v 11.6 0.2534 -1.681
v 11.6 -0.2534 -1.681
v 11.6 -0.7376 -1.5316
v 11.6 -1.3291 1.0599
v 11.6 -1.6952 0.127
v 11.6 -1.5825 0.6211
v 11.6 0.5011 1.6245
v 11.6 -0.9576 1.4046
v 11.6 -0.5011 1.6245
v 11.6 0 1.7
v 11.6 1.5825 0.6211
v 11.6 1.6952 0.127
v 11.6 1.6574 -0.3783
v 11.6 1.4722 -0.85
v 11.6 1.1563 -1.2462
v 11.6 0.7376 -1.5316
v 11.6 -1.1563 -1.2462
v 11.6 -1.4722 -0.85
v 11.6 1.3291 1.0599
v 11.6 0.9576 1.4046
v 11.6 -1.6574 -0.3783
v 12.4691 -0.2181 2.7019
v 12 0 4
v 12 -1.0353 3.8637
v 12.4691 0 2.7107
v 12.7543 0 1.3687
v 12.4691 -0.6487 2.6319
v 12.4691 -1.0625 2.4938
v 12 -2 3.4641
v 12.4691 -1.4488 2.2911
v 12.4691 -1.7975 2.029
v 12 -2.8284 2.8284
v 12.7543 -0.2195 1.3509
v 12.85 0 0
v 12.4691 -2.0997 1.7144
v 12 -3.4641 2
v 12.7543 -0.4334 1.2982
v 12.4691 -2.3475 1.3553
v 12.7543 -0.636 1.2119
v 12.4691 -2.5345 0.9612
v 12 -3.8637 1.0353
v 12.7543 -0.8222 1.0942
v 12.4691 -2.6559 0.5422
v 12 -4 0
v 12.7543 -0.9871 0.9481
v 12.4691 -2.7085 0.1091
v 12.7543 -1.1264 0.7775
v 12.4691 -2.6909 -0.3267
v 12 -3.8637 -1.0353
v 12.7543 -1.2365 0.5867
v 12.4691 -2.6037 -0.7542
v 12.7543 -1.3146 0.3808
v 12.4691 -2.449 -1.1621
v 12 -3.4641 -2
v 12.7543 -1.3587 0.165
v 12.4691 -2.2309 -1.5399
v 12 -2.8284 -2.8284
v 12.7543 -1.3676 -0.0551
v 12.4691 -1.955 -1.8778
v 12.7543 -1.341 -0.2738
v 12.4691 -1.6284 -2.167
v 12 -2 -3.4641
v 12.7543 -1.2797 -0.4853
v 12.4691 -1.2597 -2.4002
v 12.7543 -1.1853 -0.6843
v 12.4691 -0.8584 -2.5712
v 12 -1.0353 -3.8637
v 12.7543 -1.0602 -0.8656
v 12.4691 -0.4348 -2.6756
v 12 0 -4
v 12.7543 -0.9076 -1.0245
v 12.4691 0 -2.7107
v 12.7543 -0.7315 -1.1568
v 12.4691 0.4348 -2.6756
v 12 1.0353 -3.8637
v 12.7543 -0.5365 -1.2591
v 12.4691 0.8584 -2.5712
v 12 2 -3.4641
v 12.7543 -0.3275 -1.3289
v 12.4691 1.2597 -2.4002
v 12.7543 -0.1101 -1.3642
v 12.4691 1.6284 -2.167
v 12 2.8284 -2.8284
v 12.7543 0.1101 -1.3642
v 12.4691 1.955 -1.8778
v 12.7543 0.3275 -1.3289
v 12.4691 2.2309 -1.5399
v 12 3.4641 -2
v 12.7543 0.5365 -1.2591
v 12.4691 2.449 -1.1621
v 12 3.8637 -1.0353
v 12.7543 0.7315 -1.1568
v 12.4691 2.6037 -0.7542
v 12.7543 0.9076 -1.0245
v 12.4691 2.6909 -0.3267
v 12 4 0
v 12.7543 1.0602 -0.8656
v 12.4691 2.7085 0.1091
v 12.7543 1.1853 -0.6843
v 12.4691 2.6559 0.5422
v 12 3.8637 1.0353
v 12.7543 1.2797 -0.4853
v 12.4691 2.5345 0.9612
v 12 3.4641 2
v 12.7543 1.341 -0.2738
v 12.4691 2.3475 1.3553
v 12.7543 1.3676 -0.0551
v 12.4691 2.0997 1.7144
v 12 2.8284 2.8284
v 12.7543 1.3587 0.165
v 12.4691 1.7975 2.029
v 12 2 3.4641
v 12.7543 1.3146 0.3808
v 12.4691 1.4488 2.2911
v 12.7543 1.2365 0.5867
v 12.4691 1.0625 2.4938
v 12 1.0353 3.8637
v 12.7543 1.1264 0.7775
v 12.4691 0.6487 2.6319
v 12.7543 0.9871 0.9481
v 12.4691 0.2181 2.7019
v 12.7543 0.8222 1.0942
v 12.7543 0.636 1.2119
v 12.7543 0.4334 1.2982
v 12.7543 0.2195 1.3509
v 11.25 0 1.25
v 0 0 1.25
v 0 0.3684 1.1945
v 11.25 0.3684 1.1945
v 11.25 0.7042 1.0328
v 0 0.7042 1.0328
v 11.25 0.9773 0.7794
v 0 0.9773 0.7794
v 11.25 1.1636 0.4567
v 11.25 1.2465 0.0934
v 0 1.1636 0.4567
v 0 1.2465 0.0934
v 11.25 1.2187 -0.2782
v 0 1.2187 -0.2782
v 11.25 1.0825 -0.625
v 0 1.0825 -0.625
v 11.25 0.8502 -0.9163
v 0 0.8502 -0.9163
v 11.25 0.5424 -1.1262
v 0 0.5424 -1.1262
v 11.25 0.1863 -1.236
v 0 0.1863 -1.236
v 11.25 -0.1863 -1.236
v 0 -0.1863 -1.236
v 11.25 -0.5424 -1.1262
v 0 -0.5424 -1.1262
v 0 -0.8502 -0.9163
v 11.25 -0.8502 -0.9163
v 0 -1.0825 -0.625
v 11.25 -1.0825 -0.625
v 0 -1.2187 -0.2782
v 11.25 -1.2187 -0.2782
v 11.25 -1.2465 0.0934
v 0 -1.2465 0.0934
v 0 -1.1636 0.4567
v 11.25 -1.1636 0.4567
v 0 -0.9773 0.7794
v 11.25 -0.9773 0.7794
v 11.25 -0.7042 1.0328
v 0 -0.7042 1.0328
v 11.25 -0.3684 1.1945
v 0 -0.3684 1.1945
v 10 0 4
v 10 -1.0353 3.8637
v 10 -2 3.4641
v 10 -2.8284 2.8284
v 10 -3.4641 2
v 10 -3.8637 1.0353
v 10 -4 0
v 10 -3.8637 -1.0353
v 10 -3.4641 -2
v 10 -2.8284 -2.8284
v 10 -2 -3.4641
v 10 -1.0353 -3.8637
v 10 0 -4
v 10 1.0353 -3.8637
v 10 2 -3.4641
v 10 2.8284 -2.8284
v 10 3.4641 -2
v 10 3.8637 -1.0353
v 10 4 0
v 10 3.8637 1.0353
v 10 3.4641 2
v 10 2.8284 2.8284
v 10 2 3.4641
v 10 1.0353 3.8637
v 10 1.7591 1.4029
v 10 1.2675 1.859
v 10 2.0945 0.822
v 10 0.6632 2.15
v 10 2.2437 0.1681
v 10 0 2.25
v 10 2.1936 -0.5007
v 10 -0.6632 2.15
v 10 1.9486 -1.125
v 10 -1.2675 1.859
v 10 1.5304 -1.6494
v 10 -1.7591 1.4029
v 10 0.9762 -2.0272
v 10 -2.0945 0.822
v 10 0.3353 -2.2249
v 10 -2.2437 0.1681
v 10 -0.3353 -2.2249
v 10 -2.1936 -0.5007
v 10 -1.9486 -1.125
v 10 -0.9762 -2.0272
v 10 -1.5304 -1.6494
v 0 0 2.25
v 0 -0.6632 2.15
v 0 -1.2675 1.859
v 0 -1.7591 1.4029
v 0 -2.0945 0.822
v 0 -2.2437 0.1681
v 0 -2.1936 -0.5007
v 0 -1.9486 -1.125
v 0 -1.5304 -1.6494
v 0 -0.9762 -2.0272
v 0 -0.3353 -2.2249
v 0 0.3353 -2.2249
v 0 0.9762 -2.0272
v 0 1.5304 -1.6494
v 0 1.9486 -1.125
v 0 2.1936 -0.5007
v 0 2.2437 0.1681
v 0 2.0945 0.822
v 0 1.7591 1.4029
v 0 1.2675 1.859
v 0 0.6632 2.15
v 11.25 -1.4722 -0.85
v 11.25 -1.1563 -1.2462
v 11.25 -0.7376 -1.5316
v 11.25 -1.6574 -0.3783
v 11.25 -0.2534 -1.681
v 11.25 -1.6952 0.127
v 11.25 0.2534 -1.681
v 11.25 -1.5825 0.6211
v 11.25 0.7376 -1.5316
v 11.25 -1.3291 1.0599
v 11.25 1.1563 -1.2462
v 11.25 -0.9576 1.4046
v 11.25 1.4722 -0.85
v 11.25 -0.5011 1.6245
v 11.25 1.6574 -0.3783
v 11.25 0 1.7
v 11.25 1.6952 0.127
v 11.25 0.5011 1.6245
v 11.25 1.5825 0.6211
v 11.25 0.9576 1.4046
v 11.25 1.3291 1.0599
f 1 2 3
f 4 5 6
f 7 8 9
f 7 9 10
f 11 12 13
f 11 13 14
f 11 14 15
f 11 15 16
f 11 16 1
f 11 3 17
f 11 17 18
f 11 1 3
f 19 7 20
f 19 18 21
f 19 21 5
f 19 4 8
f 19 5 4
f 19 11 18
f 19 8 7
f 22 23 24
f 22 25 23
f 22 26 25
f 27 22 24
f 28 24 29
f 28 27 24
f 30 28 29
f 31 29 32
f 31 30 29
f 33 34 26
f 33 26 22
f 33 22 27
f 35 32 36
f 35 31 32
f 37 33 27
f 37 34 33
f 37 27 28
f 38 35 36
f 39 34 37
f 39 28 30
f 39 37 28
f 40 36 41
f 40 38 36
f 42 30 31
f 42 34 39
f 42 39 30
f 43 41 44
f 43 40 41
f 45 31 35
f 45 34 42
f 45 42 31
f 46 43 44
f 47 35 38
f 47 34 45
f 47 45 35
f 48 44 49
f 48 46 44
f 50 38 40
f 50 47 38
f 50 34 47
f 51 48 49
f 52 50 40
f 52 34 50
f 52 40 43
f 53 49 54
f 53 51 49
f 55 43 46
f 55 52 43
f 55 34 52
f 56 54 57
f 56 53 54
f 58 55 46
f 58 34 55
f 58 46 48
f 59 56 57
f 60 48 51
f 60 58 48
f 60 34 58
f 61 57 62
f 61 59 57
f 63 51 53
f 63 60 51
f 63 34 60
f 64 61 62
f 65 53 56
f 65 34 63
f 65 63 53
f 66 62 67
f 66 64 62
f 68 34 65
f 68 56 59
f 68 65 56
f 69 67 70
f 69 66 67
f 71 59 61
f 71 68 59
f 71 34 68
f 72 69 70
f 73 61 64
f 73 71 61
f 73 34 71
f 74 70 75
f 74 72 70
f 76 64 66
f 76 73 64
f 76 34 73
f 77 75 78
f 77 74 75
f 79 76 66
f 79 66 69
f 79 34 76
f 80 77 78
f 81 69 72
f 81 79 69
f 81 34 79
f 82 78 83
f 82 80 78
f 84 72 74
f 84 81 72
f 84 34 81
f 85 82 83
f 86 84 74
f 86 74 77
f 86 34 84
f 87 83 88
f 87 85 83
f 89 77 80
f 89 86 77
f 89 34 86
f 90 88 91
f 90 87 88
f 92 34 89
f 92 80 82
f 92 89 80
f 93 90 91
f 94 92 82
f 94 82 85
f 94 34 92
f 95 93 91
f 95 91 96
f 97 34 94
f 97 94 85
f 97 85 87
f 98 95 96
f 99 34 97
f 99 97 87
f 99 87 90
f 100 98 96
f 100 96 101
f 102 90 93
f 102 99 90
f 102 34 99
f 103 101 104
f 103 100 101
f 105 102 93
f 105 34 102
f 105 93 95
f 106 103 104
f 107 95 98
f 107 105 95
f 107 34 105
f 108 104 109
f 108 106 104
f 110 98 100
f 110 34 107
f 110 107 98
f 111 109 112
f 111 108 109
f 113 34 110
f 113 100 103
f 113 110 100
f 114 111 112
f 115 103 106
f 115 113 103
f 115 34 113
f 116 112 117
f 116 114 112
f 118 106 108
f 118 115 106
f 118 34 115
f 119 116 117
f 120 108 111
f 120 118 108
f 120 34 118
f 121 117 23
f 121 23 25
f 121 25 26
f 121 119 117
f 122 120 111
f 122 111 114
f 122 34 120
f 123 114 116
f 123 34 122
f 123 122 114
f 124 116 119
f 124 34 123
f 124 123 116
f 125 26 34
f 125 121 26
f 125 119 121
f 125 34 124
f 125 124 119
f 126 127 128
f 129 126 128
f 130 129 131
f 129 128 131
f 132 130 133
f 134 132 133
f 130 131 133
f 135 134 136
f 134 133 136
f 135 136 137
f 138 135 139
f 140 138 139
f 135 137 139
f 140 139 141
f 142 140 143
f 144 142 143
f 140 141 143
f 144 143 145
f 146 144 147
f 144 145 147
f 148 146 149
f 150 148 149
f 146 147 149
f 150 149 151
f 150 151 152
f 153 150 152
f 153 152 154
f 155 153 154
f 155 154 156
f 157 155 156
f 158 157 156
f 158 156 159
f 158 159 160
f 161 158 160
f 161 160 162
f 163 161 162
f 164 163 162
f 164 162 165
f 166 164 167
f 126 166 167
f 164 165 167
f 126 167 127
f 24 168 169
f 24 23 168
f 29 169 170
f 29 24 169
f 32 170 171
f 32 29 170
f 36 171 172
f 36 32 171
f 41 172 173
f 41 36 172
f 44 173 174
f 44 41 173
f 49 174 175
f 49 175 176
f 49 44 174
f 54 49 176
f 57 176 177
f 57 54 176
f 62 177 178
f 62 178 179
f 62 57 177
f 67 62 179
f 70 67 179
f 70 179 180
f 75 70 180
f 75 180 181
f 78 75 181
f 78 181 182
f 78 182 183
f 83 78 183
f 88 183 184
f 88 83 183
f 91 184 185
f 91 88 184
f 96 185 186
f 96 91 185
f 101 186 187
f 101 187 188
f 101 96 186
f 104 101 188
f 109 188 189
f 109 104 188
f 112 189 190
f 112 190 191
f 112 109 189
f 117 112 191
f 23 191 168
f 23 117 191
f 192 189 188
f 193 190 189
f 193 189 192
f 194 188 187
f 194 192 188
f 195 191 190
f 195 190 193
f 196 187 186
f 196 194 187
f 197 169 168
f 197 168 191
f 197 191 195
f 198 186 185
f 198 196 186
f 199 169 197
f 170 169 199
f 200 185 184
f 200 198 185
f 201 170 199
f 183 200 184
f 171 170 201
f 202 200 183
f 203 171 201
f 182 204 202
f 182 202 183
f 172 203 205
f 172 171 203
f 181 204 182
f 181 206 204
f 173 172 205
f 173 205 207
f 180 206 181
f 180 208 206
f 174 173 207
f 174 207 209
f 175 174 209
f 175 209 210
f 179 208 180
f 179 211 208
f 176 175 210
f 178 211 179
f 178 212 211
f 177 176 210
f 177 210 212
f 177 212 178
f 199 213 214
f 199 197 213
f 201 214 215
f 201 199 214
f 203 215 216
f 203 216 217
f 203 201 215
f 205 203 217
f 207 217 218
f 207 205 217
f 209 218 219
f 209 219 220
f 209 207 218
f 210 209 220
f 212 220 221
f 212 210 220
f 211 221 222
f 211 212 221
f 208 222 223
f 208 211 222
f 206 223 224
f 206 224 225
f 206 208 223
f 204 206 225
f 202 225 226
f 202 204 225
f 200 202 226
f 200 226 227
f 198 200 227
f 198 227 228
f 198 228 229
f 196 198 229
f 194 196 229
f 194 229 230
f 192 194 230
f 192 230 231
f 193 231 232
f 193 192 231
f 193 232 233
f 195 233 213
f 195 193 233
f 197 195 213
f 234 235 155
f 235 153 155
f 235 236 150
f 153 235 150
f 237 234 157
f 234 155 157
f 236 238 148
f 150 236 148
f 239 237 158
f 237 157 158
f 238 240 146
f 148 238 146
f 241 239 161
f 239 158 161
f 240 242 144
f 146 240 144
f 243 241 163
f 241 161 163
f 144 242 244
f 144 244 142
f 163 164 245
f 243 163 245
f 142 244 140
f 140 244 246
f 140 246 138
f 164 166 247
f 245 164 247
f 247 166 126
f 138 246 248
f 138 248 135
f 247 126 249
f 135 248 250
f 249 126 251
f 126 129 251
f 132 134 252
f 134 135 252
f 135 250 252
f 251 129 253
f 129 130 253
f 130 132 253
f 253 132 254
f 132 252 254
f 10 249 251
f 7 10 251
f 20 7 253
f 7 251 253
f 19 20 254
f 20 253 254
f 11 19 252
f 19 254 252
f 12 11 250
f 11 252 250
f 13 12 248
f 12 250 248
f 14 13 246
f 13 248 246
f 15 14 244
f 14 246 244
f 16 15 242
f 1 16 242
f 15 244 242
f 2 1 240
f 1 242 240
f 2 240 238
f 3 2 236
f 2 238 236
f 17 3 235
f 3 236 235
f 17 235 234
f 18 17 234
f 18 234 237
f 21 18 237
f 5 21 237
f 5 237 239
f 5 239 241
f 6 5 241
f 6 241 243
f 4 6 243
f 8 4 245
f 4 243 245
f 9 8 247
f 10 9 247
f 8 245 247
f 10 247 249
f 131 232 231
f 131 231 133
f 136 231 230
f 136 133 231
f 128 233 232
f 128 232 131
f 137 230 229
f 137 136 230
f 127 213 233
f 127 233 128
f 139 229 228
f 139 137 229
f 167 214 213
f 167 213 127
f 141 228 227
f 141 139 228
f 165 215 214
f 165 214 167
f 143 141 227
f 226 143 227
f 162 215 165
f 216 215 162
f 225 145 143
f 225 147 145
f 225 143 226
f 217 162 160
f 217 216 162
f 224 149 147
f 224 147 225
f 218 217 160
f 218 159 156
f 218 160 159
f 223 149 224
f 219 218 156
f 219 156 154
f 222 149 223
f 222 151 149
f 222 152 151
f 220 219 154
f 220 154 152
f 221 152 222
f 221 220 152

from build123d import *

# Parameters (mm, degrees)
SKETCH2_R          = 1.25
CUT_EXTRUDE1_DEPTH = 11.25
SKETCH3_R          = 1.7
CUT_EXTRUDE2_DEPTH = 0.35


with BuildPart() as part:
    # Sketch1 → Revolve1 (revolve)
    with BuildSketch(Plane.XY, mode=Mode.PRIVATE) as revolve1_sk:
        with BuildLine():
            Line((0, 0), (0, 2.25))
            Line((0, 2.25), (10, 2.25))
            Line((10, 2.25), (10, 4))
            Line((10, 4), (12, 4))
            ThreePointArc((12, 4), (12.635153756, 2.044657673), (12.85, 0))
            Line((12.85, 0), (0, 0))
        make_face()
    revolve(revolve1_sk.sketch.rotate(Axis((0, 0, 0), (1, 0, 0)), 90), axis=Axis((0, 0, 0), (1, 0, 0)))

    # Sketch2 → Cut-Extrude1 (cut)
    with BuildSketch(Plane.ZY):
        Circle(SKETCH2_R)
    extrude(amount=-CUT_EXTRUDE1_DEPTH, mode=Mode.SUBTRACT)

    # Sketch3 → Cut-Extrude2 (cut)
    with BuildSketch(Plane.ZY.offset(-11.25)):
        Circle(SKETCH3_R)
    extrude(amount=-CUT_EXTRUDE2_DEPTH, mode=Mode.SUBTRACT)


solid = part.part
